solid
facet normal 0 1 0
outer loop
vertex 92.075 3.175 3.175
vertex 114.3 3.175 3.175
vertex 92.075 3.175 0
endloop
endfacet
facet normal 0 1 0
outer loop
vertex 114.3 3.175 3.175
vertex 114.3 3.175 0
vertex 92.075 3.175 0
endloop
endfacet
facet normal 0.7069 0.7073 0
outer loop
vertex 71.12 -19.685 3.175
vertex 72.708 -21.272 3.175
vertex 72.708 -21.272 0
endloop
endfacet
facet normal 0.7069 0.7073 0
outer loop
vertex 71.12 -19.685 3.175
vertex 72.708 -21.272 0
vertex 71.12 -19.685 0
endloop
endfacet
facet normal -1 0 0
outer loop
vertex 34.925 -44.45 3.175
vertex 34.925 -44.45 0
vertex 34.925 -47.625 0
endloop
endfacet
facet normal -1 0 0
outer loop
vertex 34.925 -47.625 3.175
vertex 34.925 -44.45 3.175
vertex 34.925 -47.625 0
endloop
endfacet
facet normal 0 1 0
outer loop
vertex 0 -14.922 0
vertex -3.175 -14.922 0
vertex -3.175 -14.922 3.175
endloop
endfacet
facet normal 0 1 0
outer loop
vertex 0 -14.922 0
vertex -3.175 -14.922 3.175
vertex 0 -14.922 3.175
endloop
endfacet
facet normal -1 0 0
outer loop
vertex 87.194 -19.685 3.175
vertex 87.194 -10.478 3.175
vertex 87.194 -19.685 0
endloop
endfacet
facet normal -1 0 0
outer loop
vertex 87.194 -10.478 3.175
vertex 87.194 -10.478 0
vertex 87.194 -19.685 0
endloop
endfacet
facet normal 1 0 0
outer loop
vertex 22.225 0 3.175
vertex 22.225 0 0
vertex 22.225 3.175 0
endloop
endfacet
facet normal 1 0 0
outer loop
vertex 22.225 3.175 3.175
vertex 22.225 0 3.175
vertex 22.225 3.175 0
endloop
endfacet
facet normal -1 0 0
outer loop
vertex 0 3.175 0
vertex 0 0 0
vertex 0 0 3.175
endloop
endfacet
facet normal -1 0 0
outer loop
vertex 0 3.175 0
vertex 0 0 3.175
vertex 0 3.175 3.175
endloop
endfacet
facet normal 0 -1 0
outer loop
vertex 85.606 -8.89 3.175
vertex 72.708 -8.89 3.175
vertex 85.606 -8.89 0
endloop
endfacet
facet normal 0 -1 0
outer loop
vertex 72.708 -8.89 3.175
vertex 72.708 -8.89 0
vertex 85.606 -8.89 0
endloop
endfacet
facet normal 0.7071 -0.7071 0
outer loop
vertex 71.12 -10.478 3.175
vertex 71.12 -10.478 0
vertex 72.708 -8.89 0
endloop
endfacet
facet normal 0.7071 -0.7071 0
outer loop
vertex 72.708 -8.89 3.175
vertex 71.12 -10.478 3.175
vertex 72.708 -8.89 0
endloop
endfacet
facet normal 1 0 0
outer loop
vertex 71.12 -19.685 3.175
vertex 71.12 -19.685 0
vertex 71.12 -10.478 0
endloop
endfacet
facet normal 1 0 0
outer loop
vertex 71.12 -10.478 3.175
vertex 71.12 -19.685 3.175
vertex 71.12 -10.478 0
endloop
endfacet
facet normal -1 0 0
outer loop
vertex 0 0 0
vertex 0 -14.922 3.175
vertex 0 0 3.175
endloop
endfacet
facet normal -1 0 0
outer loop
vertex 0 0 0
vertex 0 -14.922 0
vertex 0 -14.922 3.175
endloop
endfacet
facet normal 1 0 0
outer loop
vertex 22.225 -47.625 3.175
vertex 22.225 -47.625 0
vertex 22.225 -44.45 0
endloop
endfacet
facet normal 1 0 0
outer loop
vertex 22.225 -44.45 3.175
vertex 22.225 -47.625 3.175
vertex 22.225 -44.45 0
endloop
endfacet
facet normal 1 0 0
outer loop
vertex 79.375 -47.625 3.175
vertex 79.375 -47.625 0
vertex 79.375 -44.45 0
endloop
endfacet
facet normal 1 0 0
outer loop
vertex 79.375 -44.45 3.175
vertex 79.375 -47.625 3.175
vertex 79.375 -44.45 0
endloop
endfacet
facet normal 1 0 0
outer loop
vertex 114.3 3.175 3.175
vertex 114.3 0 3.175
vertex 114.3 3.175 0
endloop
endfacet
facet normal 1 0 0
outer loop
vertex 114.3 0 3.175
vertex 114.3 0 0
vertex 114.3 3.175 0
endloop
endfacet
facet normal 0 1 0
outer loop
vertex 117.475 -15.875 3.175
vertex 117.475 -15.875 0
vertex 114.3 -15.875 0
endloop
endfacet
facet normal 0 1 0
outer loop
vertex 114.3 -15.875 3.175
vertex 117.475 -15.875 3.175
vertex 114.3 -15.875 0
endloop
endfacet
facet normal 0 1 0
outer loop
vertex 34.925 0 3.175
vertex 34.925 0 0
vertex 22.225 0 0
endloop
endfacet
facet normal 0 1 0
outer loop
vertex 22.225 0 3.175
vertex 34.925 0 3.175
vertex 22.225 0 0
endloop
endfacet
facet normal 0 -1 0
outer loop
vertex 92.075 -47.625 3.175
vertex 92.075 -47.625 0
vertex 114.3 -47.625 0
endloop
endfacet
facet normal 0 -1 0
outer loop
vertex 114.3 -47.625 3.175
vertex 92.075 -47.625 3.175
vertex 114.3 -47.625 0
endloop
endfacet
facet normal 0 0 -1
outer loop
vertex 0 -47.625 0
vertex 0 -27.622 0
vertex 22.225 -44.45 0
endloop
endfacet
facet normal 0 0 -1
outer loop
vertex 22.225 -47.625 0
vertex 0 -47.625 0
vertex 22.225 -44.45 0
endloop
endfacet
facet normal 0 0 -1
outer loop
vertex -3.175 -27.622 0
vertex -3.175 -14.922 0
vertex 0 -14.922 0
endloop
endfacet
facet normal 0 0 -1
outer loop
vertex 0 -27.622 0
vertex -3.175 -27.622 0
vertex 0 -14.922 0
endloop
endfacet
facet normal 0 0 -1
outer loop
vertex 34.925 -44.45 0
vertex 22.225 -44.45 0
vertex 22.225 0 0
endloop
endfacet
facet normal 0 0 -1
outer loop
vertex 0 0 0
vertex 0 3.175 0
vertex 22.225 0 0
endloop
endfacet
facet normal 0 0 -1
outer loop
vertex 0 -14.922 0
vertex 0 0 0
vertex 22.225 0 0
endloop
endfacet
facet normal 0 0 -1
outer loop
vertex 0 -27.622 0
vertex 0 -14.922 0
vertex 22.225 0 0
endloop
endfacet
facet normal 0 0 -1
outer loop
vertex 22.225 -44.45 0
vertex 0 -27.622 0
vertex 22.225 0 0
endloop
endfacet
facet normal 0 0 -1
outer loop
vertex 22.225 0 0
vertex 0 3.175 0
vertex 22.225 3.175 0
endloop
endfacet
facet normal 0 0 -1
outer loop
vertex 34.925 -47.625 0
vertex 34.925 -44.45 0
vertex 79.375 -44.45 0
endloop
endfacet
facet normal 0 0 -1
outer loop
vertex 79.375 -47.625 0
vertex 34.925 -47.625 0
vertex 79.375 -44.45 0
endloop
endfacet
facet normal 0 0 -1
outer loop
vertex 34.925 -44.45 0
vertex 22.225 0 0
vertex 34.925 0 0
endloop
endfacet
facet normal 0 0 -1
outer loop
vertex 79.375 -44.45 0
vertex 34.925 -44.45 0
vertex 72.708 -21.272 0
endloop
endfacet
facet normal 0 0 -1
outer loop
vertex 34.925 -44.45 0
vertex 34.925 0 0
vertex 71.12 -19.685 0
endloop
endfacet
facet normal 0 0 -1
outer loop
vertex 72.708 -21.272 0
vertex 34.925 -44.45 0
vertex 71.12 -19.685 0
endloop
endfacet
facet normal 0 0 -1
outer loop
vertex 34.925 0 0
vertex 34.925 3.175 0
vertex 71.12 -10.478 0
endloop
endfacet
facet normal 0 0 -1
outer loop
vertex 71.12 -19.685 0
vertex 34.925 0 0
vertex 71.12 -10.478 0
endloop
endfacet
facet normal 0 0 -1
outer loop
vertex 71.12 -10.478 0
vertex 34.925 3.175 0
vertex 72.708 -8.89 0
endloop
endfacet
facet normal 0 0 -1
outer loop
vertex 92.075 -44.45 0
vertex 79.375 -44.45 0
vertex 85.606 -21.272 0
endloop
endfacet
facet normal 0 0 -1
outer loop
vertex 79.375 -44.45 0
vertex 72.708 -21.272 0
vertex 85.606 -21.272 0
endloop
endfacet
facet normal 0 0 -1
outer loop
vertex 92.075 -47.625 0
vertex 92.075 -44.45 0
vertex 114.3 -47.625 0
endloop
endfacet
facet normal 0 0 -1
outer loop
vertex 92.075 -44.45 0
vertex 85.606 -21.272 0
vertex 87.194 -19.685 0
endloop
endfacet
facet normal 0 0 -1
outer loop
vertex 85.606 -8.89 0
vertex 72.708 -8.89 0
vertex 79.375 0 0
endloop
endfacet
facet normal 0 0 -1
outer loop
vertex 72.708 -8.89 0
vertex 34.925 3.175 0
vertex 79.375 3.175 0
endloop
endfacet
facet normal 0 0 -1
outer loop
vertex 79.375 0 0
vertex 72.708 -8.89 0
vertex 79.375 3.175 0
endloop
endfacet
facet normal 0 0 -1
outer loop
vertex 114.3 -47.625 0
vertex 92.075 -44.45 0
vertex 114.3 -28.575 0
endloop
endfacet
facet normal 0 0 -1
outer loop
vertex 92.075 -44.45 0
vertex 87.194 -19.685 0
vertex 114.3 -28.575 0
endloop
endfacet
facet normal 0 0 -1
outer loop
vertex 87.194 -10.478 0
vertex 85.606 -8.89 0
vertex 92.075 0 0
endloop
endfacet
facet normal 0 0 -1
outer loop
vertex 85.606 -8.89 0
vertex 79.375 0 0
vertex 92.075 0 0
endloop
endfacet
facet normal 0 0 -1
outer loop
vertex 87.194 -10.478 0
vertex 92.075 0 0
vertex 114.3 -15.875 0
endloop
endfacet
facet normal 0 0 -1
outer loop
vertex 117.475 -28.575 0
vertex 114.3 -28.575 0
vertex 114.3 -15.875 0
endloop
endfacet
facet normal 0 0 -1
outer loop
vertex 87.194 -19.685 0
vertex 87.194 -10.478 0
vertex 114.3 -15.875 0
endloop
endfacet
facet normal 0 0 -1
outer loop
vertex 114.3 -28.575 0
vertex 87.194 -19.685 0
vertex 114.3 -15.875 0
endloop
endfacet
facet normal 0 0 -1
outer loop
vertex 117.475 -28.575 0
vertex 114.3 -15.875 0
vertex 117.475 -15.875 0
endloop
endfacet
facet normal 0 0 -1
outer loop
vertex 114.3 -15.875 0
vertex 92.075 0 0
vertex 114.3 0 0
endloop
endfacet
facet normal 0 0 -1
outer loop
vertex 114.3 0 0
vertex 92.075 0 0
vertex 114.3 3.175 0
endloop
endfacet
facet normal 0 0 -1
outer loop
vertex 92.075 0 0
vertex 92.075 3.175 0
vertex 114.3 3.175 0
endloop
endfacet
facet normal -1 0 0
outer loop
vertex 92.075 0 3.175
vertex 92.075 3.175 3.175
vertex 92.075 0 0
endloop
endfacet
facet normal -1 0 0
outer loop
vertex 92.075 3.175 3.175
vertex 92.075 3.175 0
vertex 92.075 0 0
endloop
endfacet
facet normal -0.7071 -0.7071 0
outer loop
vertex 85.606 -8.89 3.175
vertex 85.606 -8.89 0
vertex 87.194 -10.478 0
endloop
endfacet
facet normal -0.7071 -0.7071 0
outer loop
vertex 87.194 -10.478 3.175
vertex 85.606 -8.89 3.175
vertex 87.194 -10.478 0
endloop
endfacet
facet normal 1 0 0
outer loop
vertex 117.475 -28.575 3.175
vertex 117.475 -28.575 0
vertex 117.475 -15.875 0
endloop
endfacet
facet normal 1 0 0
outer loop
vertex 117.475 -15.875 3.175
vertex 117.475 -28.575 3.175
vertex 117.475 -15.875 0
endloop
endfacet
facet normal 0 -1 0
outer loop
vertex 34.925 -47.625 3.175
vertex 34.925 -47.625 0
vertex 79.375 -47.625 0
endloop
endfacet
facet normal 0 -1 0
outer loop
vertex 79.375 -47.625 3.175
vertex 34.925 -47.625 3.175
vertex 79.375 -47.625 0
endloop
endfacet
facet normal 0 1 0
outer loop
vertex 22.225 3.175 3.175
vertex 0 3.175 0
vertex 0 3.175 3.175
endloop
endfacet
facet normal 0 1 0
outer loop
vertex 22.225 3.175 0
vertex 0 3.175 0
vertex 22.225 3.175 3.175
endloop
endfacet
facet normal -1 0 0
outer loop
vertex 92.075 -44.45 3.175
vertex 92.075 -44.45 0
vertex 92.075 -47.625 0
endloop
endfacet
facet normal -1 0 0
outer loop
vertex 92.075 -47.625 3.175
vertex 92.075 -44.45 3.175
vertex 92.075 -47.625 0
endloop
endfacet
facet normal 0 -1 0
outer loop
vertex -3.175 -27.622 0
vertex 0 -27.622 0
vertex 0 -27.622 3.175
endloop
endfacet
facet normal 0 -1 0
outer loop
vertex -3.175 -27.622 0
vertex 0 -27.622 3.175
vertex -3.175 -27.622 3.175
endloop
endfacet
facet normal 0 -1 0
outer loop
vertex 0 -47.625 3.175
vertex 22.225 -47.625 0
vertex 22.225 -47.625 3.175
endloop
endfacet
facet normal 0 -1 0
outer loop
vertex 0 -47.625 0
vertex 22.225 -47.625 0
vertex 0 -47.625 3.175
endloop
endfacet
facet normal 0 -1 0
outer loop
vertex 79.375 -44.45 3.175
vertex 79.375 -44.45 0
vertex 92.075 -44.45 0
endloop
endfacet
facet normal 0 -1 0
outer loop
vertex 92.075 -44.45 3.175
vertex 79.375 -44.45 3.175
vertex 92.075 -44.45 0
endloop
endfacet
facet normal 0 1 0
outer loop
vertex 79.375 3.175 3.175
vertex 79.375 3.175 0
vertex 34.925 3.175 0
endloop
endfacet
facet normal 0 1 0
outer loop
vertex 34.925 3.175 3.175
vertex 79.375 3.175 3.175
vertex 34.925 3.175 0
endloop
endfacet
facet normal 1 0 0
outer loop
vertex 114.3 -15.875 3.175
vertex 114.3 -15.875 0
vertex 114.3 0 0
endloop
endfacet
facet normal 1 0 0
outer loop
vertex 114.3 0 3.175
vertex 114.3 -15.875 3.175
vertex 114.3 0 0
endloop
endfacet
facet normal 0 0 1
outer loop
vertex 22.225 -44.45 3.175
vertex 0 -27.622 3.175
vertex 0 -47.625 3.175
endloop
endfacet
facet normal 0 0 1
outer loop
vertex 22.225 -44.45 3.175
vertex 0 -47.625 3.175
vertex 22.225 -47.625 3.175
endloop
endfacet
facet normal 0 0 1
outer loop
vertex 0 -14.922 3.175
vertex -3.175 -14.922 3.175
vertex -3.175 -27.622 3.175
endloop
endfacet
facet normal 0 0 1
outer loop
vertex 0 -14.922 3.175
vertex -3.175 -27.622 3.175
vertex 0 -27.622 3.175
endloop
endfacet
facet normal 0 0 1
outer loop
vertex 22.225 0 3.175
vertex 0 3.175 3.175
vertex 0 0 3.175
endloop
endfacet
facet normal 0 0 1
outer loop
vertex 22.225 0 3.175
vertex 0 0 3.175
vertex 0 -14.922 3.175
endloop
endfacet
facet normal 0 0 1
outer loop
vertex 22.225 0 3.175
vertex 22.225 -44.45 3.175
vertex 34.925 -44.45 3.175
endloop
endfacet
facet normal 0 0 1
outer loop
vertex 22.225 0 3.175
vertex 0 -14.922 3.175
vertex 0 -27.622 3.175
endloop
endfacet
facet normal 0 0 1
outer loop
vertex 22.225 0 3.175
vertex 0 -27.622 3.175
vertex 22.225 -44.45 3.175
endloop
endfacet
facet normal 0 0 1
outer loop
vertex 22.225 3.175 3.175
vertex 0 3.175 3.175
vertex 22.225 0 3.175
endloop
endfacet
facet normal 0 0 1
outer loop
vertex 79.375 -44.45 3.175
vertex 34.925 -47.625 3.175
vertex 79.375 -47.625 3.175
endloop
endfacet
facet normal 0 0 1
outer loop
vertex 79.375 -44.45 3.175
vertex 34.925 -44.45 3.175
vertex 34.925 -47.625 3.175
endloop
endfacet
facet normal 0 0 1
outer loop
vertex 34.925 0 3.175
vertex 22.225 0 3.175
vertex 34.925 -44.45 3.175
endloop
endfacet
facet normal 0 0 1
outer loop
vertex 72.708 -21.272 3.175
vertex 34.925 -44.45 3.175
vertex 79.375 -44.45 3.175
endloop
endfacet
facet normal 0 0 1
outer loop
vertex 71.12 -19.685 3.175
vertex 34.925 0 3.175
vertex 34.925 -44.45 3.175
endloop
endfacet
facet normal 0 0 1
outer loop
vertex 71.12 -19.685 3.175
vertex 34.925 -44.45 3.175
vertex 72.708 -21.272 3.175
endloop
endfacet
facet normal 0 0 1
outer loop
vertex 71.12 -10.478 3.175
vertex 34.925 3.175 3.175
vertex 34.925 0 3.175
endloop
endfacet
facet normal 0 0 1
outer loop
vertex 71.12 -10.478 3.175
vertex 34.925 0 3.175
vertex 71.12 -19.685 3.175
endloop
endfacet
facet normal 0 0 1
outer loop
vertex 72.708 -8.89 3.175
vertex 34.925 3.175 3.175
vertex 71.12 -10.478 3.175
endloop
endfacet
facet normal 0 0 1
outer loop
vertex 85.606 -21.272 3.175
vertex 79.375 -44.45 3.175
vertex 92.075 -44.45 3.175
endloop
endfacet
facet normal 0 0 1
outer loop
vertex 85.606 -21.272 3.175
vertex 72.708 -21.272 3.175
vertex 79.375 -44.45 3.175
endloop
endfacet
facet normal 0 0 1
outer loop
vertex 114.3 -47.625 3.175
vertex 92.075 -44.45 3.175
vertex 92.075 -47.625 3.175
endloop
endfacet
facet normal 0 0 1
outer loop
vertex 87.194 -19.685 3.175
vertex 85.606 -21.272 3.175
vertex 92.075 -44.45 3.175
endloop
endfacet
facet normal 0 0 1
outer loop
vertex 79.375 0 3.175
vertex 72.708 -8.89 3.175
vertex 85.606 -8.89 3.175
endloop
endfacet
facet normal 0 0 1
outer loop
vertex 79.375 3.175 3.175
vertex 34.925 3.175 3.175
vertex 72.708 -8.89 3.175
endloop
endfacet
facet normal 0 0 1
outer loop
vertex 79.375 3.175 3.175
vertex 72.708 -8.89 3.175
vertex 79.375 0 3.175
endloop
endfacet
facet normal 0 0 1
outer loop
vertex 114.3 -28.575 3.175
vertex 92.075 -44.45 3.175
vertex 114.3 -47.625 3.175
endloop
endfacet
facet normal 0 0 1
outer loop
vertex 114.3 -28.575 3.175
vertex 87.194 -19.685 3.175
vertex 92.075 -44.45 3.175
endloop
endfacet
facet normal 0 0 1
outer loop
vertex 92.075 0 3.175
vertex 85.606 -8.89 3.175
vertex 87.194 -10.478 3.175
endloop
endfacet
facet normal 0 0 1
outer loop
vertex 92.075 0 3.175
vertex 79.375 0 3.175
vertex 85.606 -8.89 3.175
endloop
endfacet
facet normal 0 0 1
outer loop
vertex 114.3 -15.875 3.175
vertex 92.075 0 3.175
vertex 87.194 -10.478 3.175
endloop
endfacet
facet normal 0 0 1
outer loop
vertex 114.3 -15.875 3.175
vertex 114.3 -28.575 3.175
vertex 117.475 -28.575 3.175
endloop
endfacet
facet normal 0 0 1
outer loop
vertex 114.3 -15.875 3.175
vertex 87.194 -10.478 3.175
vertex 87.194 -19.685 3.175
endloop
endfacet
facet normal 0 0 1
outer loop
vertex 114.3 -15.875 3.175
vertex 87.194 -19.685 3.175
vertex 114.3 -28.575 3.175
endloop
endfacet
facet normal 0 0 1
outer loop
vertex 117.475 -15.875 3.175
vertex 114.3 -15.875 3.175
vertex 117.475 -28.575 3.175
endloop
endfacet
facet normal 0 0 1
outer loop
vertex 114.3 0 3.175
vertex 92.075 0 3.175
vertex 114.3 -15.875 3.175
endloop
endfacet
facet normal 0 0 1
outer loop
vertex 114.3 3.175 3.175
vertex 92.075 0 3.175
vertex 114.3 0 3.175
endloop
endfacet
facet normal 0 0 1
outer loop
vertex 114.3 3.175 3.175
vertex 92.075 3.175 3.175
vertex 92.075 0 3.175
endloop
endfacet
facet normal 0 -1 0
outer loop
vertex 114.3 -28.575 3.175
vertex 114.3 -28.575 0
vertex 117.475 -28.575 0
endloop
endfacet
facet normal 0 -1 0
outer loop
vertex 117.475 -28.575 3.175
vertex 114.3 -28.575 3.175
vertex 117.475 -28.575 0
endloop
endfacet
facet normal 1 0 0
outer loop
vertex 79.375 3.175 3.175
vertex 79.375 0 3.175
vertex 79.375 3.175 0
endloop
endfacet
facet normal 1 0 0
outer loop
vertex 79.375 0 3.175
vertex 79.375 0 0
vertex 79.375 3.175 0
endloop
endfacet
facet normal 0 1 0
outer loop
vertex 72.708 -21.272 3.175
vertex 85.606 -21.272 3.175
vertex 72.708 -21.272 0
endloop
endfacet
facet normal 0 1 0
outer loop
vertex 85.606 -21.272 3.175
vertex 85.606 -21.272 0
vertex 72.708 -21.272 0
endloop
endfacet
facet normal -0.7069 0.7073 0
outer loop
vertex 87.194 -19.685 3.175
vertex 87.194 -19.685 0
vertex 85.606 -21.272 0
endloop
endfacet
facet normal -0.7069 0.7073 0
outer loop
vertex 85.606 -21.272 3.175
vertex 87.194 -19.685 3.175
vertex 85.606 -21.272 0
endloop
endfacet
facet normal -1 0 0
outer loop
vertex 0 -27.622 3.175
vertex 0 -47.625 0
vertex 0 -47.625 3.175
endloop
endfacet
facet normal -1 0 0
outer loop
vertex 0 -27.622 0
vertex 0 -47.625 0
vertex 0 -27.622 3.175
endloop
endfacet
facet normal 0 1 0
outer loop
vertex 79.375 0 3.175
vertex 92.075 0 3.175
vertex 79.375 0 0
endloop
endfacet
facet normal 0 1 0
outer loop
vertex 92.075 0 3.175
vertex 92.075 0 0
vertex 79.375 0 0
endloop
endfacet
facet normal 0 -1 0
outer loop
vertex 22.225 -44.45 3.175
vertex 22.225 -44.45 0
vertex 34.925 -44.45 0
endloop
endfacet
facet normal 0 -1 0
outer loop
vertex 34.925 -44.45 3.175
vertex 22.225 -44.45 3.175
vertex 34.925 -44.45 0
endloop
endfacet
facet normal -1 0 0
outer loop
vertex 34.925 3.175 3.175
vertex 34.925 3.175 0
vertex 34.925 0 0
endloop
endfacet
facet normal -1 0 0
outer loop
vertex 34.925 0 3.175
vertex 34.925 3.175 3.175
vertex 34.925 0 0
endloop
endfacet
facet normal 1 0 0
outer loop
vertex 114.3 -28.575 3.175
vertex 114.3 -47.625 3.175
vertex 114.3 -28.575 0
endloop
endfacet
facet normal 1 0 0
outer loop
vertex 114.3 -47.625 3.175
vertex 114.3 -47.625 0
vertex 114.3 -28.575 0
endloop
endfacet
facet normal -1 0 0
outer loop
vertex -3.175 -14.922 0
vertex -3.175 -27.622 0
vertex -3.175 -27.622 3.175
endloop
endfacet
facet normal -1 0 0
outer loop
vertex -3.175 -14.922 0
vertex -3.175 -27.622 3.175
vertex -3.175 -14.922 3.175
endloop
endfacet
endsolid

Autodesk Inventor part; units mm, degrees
ref_plane "YZ Plane" through (0, 0, 0) normal (1, 0, 0) x (0, 1, 0)
ref_plane "XZ Plane" through (0, 0, 0) normal (0, 1, 0) x (-1, 0, 0)
ref_plane "XY Plane" through (0, 0, 0) normal (0, 0, 1) x (1, 0, 0)
sketch "Sketch1" plane through (0, 0, 0) normal (0, 0, 1) x (1, 0, 0)
  line L0 (22.225, 0) -> (22.225, 3.175) projected
  line L1 (22.225, -47.625) -> (22.225, -44.45) projected
  line L2 (22.225, -44.45) -> (34.925, -44.45) projected
  line L3 (34.925, -44.45) -> (34.925, -47.625) projected
  line L4 (34.925, -47.625) -> (79.375, -47.625) projected
  line L5 (79.375, -47.625) -> (79.375, -44.45) projected
  line L6 (79.375, -44.45) -> (92.075, -44.45) projected
  line L7 (92.075, -44.45) -> (92.075, -47.625) projected
  line L8 (117.475, 3.175) -> (92.075, 3.175) projected
  line L9 (92.075, 3.175) -> (92.075, 0) projected
  line L10 (92.075, 0) -> (79.375, 0) projected
  line L11 (79.375, 0) -> (79.375, 3.175) projected
  line L12 (79.375, 3.175) -> (34.925, 3.175) projected
  line L13 (34.925, 3.175) -> (34.925, 0) projected
  line L14 (34.925, 0) -> (22.225, 0) projected
  line L15 (85.6063, -21.2725) -> (72.708, -21.2725) projected
  line L16 (72.708, -21.2725) -> (71.1205, -19.685) projected
  line L17 (71.1205, -19.685) -> (71.1205, -10.4775) projected
  line L18 (71.1205, -10.4775) -> (72.708, -8.89) projected
  line L19 (72.708, -8.89) -> (85.6063, -8.89) projected
  line L20 (85.6063, -8.89) -> (87.1938, -10.4775) projected
  line L21 (87.1938, -10.4775) -> (87.1938, -19.685) projected
  line L22 (87.1938, -19.685) -> (85.6063, -21.2725) projected
  line L23 (0, 0) -> (0, 3.175) projected
  line L24 (0, 3.175) -> (22.225, 3.175)
  line L25 (0, -27.6225) -> (-3.175, -27.6225)
  line L26 (-3.175, -27.6225) -> (-3.175, -14.9225)
  line L27 (-3.175, -14.9225) -> (0, -14.9225)
  line L28 (3.175, -14.9225) -> (3.175, -27.6225)
  line L29 (3.175, -27.6225) -> (-3.175, -14.9225) construction
  line L30 (-3.175, -27.6225) -> (3.175, -14.9225) construction
  line L31 (0, -47.625) -> (0, -27.6225)
  line L32 (0, -14.9225) -> (0, 3.175)
  line L33 (114.3, 0) -> (114.3, 3.175) projected
  line L34 (92.075, -47.625) -> (114.3, -47.625)
  line L35 (114.3, -28.575) -> (117.475, -28.575)
  line L36 (117.475, -28.575) -> (117.475, -15.875)
  line L37 (117.475, -15.875) -> (114.3, -15.875)
  line L38 (111.125, -15.875) -> (111.125, -28.575)
  line L39 (111.125, -28.575) -> (117.475, -15.875) construction
  line L40 (117.475, -28.575) -> (111.125, -15.875) construction
  line L41 (114.3, -47.625) -> (114.3, -28.575)
  line L42 (114.3, -15.875) -> (114.3, 3.175)
  line L43 (22.225, -47.625) -> (0, -47.625)
  point P0 (0, -21.2725)
  point P1 (114.3, -22.225)
  dimension "d2" = 6.35
  dimension "d3" = 12.7
  dimension "d4" = 6.35
  dimension "d5" = 12.7
extrude "Extrusion1" add sketch "Sketch1" along normal blind 3.175
properties part number "Side 2" material "ABS Plastic"
